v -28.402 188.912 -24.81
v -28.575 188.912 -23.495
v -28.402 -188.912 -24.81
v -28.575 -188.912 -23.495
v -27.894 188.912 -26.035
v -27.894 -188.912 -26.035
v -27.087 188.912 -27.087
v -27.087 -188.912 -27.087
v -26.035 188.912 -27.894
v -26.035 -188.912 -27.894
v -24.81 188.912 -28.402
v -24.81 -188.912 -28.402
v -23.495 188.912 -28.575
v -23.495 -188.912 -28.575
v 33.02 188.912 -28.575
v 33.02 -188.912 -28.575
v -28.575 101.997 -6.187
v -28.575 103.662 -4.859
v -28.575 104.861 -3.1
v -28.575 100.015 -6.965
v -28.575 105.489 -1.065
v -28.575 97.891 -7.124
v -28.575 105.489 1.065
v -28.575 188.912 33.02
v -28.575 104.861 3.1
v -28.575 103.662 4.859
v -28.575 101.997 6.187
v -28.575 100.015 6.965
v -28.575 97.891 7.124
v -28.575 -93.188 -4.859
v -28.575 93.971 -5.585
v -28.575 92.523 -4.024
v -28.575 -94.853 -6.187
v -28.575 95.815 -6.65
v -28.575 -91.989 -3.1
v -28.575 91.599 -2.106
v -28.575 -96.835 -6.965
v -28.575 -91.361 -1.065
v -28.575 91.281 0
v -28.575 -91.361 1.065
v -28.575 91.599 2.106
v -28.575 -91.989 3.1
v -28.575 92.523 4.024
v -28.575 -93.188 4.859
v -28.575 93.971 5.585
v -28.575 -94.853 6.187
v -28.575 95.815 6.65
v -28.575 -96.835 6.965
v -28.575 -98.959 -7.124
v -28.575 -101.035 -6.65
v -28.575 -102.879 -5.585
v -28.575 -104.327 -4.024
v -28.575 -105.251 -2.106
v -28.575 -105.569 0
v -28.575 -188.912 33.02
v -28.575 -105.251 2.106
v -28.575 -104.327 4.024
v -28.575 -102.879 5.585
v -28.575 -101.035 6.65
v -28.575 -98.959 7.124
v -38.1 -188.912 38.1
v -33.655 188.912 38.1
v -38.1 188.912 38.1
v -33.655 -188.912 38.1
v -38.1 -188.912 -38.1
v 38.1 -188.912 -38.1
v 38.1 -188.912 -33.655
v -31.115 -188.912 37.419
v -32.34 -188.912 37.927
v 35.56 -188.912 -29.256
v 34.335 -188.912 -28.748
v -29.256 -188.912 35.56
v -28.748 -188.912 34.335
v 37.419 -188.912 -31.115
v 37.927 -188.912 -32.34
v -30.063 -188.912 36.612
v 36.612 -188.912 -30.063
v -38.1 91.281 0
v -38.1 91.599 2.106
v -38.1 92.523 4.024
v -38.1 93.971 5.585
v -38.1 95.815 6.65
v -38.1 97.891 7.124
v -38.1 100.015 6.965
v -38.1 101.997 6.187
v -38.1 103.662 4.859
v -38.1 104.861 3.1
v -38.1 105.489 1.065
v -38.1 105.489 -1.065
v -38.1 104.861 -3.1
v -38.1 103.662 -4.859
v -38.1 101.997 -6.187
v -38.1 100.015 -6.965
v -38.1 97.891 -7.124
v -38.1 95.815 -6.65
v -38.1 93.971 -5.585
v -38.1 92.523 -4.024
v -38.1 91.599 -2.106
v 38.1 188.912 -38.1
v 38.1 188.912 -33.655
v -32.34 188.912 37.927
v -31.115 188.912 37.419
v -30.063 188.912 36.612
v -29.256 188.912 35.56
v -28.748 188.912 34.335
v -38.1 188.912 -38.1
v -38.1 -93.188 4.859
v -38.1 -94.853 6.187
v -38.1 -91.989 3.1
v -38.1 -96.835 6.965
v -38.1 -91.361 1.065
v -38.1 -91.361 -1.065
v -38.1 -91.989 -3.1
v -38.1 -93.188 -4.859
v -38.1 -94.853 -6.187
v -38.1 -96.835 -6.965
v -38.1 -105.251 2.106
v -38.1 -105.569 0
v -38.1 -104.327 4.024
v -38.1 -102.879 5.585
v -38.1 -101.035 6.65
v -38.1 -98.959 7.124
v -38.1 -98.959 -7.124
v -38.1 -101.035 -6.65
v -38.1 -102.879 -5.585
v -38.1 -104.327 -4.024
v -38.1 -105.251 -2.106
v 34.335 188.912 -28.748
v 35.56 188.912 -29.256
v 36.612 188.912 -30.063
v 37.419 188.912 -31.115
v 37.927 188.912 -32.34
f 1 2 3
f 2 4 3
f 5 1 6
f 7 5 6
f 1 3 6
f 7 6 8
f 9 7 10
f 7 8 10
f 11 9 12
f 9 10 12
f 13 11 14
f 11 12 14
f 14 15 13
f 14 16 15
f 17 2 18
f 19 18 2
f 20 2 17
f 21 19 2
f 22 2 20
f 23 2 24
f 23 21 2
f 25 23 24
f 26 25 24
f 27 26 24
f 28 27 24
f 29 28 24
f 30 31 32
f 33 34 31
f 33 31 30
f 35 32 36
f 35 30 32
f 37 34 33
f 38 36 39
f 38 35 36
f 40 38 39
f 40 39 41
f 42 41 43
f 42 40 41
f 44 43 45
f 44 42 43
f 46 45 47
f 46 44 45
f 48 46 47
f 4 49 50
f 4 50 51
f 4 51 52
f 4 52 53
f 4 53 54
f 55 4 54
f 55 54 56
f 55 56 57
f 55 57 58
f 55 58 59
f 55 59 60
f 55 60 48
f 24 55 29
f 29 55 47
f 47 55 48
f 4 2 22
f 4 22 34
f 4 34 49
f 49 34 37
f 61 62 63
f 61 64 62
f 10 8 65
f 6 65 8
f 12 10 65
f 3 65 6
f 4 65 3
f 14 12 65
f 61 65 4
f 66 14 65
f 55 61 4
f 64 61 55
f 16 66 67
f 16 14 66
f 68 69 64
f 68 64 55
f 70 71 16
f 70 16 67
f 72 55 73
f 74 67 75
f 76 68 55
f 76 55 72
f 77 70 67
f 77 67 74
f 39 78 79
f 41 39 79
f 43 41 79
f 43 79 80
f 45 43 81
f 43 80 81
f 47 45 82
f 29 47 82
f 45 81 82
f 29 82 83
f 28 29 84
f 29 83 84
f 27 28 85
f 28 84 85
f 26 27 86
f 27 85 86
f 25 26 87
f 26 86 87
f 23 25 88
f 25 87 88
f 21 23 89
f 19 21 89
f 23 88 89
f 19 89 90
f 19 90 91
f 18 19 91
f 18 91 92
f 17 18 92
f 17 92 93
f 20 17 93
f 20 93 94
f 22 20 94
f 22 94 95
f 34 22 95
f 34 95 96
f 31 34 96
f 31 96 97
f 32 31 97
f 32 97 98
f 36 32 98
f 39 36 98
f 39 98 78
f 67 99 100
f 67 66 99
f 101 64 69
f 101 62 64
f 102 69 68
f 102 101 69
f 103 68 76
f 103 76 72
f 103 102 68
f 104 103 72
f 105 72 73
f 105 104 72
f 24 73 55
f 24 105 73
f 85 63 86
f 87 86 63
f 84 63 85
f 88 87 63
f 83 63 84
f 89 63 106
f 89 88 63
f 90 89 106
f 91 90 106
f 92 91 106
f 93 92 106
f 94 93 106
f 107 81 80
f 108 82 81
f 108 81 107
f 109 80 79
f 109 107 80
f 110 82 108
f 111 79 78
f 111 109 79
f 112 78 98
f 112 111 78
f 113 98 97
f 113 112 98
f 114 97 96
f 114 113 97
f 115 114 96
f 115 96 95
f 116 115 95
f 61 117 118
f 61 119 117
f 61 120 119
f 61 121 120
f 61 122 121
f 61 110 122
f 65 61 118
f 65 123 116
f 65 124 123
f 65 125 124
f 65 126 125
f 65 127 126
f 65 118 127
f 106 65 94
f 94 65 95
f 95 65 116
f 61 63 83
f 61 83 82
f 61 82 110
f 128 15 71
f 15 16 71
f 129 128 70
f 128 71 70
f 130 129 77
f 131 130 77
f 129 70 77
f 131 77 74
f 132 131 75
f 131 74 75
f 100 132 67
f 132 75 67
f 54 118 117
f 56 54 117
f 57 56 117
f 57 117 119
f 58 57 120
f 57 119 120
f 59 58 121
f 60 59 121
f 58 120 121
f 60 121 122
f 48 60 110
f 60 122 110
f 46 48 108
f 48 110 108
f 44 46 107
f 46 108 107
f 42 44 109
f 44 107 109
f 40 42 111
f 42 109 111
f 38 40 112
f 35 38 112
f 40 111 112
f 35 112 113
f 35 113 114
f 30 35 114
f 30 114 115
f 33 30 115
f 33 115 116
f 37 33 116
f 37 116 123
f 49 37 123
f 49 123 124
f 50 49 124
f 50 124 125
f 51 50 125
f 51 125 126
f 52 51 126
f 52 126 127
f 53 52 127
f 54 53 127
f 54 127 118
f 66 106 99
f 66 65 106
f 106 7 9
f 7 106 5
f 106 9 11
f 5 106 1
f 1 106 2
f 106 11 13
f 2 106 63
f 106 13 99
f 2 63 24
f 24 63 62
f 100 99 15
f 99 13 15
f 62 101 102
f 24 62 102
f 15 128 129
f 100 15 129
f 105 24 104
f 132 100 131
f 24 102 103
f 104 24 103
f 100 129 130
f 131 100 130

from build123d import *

# Parameters (mm, degrees)
F1_DEPTH = 188.9125
F2_R     = 5.08
F3_R     = 7.14375
F4_DEPTH = 25.4


with BuildPart() as f1:
    # F0 (on Front) → F1 (new body, symmetric)
    with BuildSketch(Plane.XZ):
        Polygon((-38.1, -38.1), (38.1, -38.1), (38.1, -28.575), (-28.575, -28.575), (-28.575, 38.1), (-38.1, 38.1), align=None)
    extrude(amount=F1_DEPTH, both=True)

    # F2
    f2_edges = [f1.edges().sort_by_distance(p)[0] for p in [
        (-28.575, 0, 38.1),
        (-28.575, 0, -28.575),
        (38.1, 0, -28.575),
    ]]
    fillet(f2_edges, radius=F2_R)

    # F3 (on face) → F4 (cut)
    with BuildSketch(Plane(origin=(-38.1, 0, 0), x_dir=(0, -1, 0), z_dir=(-1, 0, 0))):
        with Locations((-98.425, 0)):
            Circle(F3_R)
        with Locations((98.425, 0)):
            Circle(F3_R)
    extrude(amount=-F4_DEPTH, mode=Mode.SUBTRACT)


solid = f1.part
